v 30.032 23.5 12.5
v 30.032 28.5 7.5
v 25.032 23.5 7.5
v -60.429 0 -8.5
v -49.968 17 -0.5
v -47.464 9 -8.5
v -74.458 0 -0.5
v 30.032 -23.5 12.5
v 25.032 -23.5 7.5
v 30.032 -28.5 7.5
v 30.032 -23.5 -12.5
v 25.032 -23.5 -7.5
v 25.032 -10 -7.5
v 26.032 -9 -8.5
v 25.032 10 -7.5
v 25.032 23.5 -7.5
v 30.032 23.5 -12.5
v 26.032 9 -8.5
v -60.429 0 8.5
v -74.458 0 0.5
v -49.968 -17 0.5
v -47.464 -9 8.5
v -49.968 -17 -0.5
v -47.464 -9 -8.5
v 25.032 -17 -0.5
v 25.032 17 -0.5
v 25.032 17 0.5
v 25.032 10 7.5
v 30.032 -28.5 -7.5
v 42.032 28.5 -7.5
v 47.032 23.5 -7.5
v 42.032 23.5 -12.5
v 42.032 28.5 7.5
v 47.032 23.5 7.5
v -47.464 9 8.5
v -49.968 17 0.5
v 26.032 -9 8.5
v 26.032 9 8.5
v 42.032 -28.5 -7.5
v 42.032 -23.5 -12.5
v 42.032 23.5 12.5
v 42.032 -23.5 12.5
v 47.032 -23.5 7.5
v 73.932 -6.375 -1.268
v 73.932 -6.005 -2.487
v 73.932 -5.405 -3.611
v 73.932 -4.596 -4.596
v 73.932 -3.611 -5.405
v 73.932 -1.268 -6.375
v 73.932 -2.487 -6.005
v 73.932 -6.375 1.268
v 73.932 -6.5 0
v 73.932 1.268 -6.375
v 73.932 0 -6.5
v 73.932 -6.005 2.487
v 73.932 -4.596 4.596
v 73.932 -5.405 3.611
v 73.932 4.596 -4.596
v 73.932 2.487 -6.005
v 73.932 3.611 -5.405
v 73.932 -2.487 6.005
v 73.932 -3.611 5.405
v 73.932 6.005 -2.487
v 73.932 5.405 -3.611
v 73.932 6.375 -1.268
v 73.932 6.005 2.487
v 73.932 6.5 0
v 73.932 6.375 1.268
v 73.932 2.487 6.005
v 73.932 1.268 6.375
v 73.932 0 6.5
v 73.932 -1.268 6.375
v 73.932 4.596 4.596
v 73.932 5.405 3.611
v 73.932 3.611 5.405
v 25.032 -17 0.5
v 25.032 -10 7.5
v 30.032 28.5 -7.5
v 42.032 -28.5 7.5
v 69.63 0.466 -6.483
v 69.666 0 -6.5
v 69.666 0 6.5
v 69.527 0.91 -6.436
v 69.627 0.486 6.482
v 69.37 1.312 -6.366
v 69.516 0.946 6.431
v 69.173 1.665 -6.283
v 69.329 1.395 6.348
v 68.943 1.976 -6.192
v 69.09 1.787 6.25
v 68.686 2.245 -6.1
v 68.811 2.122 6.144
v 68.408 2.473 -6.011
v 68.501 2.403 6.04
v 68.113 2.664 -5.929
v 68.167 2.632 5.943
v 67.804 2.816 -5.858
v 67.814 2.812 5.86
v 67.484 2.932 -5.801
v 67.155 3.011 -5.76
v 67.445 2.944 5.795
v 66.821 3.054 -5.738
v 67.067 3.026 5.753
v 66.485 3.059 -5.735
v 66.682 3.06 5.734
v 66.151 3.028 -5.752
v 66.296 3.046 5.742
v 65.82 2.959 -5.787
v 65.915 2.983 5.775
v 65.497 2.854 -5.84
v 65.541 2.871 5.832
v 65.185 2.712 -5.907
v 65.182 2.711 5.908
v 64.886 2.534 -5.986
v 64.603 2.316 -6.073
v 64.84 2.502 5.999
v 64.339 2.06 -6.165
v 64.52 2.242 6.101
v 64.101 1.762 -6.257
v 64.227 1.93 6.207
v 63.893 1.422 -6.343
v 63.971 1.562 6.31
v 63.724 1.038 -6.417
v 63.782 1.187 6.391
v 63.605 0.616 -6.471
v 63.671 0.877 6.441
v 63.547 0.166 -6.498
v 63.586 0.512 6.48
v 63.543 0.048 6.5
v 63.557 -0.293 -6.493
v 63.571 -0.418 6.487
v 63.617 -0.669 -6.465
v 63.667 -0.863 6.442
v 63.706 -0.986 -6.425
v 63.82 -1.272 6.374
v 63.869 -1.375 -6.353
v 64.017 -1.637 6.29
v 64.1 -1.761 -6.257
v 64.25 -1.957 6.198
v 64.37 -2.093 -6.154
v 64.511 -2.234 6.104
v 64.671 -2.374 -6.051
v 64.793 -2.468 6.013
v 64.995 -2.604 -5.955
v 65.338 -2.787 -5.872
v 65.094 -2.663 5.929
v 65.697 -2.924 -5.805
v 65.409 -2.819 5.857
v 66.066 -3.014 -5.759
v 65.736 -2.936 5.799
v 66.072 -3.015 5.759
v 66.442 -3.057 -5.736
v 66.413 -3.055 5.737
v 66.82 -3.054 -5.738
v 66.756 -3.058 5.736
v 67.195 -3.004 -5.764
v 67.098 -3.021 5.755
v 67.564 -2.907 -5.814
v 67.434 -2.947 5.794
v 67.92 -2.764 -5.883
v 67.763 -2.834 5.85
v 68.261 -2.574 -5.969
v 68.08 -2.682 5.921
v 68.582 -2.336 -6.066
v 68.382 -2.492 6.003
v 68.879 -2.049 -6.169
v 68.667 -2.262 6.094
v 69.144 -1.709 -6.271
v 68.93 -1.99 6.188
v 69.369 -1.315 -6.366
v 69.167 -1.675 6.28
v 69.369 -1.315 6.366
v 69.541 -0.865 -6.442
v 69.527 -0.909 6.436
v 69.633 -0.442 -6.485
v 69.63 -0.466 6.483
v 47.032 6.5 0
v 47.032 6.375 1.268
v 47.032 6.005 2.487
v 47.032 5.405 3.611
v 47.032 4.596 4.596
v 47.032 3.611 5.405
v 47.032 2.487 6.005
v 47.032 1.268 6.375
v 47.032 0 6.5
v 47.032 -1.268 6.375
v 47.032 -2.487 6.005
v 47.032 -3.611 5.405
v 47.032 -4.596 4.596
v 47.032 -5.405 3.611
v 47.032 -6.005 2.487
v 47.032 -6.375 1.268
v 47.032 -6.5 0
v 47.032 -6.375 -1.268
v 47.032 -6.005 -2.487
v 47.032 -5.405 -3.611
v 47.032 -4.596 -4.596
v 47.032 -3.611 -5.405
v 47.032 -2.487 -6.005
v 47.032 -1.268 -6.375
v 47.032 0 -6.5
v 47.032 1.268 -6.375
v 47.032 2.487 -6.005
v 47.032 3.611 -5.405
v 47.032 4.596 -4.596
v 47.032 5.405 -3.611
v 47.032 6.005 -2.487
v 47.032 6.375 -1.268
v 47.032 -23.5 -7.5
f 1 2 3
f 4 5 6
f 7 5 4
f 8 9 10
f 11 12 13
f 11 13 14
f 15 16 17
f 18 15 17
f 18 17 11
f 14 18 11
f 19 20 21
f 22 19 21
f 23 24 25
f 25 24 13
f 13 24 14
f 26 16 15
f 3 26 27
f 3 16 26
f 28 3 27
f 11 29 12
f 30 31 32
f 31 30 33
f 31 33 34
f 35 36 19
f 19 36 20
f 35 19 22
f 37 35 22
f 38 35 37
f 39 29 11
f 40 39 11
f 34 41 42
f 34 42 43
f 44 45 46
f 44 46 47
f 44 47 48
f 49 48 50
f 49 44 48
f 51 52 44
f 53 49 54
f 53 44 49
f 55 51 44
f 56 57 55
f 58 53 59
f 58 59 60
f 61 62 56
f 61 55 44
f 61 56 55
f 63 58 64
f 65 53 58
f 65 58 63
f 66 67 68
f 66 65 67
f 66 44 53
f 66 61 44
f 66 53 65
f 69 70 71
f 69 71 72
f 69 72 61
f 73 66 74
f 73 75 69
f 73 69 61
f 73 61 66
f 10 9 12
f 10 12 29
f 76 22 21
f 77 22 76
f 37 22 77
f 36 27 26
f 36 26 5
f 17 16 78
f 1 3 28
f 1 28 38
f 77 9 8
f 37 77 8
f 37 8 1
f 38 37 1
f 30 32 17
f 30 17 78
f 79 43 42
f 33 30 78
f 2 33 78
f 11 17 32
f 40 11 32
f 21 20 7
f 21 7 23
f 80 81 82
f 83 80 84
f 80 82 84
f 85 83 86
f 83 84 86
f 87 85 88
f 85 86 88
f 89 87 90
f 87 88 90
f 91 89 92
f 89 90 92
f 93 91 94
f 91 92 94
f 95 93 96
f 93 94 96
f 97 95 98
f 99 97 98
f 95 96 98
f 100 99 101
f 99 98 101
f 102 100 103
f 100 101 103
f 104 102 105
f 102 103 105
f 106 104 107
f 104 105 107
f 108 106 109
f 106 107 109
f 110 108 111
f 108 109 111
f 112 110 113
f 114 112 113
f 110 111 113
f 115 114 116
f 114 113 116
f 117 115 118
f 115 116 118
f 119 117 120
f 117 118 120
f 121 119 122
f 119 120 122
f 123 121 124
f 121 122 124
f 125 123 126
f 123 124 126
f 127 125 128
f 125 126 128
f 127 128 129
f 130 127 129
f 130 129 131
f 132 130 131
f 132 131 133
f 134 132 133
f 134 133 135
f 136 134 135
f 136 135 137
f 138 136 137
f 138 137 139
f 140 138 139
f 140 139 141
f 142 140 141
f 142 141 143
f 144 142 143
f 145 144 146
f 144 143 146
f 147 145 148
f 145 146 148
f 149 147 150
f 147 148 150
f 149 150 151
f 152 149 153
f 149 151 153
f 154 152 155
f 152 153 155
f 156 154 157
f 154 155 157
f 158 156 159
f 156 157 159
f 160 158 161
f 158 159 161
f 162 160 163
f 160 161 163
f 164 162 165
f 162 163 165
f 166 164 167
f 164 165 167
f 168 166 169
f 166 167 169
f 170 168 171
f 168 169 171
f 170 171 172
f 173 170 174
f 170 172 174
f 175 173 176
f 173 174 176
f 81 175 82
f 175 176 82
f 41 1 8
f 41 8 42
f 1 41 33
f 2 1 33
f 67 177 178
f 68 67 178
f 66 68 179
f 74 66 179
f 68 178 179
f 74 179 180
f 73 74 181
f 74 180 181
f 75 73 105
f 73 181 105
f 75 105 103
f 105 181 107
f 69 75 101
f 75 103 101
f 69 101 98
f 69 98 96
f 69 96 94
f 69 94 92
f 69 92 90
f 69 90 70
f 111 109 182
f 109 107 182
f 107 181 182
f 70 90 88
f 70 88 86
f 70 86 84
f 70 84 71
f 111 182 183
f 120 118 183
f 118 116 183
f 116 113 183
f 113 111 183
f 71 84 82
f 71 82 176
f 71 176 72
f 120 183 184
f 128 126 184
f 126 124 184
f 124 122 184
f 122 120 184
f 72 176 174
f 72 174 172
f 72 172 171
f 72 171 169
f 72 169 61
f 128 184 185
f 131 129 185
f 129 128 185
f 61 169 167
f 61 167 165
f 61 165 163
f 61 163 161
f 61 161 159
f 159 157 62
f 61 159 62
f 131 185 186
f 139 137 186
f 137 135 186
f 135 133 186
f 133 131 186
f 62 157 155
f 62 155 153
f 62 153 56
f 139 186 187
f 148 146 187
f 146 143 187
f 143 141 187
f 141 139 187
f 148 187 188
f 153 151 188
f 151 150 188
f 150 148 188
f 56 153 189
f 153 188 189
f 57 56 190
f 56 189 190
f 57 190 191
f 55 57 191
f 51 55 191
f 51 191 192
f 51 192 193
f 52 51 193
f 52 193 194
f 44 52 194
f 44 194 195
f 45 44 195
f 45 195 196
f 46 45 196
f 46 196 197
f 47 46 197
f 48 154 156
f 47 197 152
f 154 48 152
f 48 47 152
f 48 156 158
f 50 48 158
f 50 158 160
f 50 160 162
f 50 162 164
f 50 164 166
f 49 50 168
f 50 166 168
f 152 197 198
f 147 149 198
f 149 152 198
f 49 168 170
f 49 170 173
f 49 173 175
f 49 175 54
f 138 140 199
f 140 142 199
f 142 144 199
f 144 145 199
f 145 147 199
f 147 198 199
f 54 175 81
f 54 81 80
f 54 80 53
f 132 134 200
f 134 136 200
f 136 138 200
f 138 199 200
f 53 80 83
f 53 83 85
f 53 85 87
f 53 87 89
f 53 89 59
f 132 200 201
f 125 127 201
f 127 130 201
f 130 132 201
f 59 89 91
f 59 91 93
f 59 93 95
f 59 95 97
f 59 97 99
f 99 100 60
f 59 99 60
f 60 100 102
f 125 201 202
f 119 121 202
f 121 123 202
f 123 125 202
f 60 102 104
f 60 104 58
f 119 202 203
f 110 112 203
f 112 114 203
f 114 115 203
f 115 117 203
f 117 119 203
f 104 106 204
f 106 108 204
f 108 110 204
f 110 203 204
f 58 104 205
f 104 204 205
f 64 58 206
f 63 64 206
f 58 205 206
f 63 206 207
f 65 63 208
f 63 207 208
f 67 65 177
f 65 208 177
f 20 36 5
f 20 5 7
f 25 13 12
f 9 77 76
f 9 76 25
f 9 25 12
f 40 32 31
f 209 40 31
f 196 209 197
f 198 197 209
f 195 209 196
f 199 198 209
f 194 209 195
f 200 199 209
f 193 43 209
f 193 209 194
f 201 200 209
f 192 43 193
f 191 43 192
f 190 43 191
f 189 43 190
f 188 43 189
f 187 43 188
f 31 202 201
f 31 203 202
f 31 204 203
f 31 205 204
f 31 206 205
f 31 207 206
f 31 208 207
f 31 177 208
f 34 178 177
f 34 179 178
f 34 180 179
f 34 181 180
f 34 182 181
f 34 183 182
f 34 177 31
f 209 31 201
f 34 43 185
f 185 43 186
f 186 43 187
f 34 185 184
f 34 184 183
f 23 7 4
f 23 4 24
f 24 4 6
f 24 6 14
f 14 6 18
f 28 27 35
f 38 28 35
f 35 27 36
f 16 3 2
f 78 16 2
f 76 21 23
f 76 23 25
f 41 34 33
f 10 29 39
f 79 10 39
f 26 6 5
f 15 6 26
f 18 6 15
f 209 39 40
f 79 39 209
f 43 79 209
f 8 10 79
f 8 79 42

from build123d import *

# Parameters (mm, degrees)
F1_DEPTH     = 12.5
F2_DEPTH     = 8.5
F3_SIZE      = 8
F4_T1_DEPTH  = 6.3508529611
F4_T3_DEPTH  = 6.3508529611
F4_T5_DEPTH  = 6.3508529611
F4_T7_DEPTH  = 6.3508529611
F4_T9_DEPTH  = 6.3508529611
F4_T11_DEPTH = 6.3508529611
F4_T13_DEPTH = 6.3508529611
F4_T15_DEPTH = 6.3508529611
F4_T17_DEPTH = 50.7168298797
F4_T19_DEPTH = 47.7168298797
F4_T21_DEPTH = 82.7168298797
F4_T26_DEPTH = 82.7168298797
F4_T31_DEPTH = 82.7168298797
F4_T36_DEPTH = 82.7168298797
F4_T41_DEPTH = 82.7168298797
F4_T46_DEPTH = 82.7168298797
F4_T51_DEPTH = 82.7168298797
F5_R         = 6.5
F6_DEPTH     = 26.9
F7_R         = 3.0614301368
F8_DEPTH     = 6.5


# Not quite as in the source:
# - a fillet or chamfer that OpenCascade refuses, or shapes differently, is made with other operations: its cross-section is extruded or revolved along the edge and cut away or added


with BuildPart() as f1:
    # F0 (on Top) → F1 (new body, symmetric)
    with BuildSketch(Plane.XY):
        Polygon((25.0318072736, -28.5), (47.0318072736, -28.5), (47.0318072736, 0), (47.0318072736, 28.5), (25.0318072736, 28.5), (25.0318072736, 17), (25.0318072736, -17), align=None)
    extrude(amount=F1_DEPTH, both=True)

    # F0 (on Top) → F2 (join, symmetric)
    with BuildSketch(Plane.XY):
        Polygon((-49.9681927264, -17), (25.0318072736, -17), (25.0318072736, 17), (-49.9681927264, 17), (-74.4579061866, 0), align=None)
    extrude(amount=F2_DEPTH, both=True)

    # F3
    f3_edges = [f1.edges().sort_by_distance(p)[0] for p in [
        (-12.468193, 17, -8.5),
        (-12.468193, -17, -8.5),
        (-62.213049, -8.5, -8.5),
        (-12.468193, -17, 8.5),
        (-12.468193, 17, 8.5),
        (-62.213049, -8.5, 8.5),
        (-62.213049, 8.5, 8.5),
        (-62.213049, 8.5, -8.5),
    ]]
    chamfer(f3_edges, length=F3_SIZE)

    # F4: chamfer of 5 on 12 edges, made by hand

    # F4_s2 → F4_t1 (cut)
    with BuildSketch(Plane(origin=(-1.9893975755, 1.9893975755, -1.9893975755), x_dir=(-0.7071067812, -0.7071067812, 0), z_dir=(-0.5773502692, 0.5773502692, -0.5773502692))):
        Polygon((-34.3171700264, -6.7490820577), (-37.8527039324, -12.8728064147), (-41.3882378383, -6.7490820577), align=None)
    extrude(amount=F4_T1_DEPTH, mode=Mode.SUBTRACT)

    # F4_s4 → F4_t3 (cut)
    with BuildSketch(Plane(origin=(-1.9893975755, -1.9893975755, -1.9893975755), x_dir=(0.7071067812, -0.7071067812, 0), z_dir=(-0.5773502692, -0.5773502692, -0.5773502692))):
        Polygon((34.3171700264, -6.7490820577), (41.3882378383, -6.7490820577), (37.8527039324, -12.8728064147), align=None)
    extrude(amount=F4_T3_DEPTH, mode=Mode.SUBTRACT)

    # F4_s6 → F4_t5 (cut)
    with BuildSketch(Plane(origin=(-1.9893975755, -1.9893975755, 1.9893975755), x_dir=(0.7071067812, -0.7071067812, 0), z_dir=(-0.5773502692, -0.5773502692, 0.5773502692))):
        Polygon((34.3171700264, 6.7490820577), (41.3882378383, 6.7490820577), (37.8527039324, 12.8728064147), align=None)
    extrude(amount=F4_T5_DEPTH, mode=Mode.SUBTRACT)

    # F4_s8 → F4_t7 (cut)
    with BuildSketch(Plane(origin=(-1.9893975755, 1.9893975755, 1.9893975755), x_dir=(-0.7071067812, -0.7071067812, 0), z_dir=(-0.5773502692, 0.5773502692, 0.5773502692))):
        Polygon((-34.3171700264, 6.7490820577), (-37.8527039324, 12.8728064147), (-41.3882378383, 6.7490820577), align=None)
    extrude(amount=F4_T7_DEPTH, mode=Mode.SUBTRACT)

    # F4_s10 → F4_t9 (cut)
    with BuildSketch(Plane(origin=(26.0106024245, 26.0106024245, -26.0106024245), x_dir=(-0.7071067812, 0.7071067812, 0), z_dir=(0.5773502692, 0.5773502692, -0.5773502692))):
        Polygon((-16.6395004968, 22.6707653858), (-13.1039665908, 16.5470410289), (-9.5684326849, 22.6707653858), align=None)
    extrude(amount=F4_T9_DEPTH, mode=Mode.SUBTRACT)

    # F4_s12 → F4_t11 (cut)
    with BuildSketch(Plane(origin=(26.0106024245, 26.0106024245, 26.0106024245), x_dir=(-0.7071067812, 0.7071067812, 0), z_dir=(0.5773502692, 0.5773502692, 0.5773502692))):
        Polygon((-13.1039665908, -16.5470410289), (-16.6395004968, -22.6707653858), (-9.5684326849, -22.6707653858), align=None)
    extrude(amount=F4_T11_DEPTH, mode=Mode.SUBTRACT)

    # F4_s14 → F4_t13 (cut)
    with BuildSketch(Plane(origin=(26.0106024245, -26.0106024245, -26.0106024245), x_dir=(0.7071067812, 0.7071067812, 0), z_dir=(0.5773502692, -0.5773502692, -0.5773502692))):
        Polygon((16.6395004968, 22.6707653858), (9.5684326849, 22.6707653858), (13.1039665908, 16.5470410289), align=None)
    extrude(amount=F4_T13_DEPTH, mode=Mode.SUBTRACT)

    # F4_s16 → F4_t15 (cut)
    with BuildSketch(Plane(origin=(26.0106024245, -26.0106024245, 26.0106024245), x_dir=(0.7071067812, 0.7071067812, 0), z_dir=(0.5773502692, -0.5773502692, 0.5773502692))):
        Polygon((9.5684326849, -22.6707653858), (13.1039665908, -16.5470410289), (16.6395004968, -22.6707653858), align=None)
    extrude(amount=F4_T15_DEPTH, mode=Mode.SUBTRACT)

    # F4_s18 → F4_t17 (cut)
    with BuildSketch(Plane.XY.offset(-25.3584149398)):
        Polygon((25.0318072736, -23.5), (30.0318072736, -28.5), (25.0318072736, -28.5), align=None)
        Polygon((25.0318072736, 23.5), (30.0318072736, 28.5), (25.0318072736, 28.5), align=None)
        Polygon((42.0318072736, 28.5), (47.0318072736, 23.5), (47.0318072736, 28.5), align=None)
        Polygon((42.0318072736, -28.5), (47.0318072736, -23.5), (47.0318072736, -28.5), align=None)
    extrude(amount=F4_T17_DEPTH, mode=Mode.SUBTRACT)

    # F4_s20 → F4_t19 (cut)
    with BuildSketch(Plane.YZ.offset(12.1733923338)):
        Polygon((23.5, -12.5), (28.5, -7.5), (28.5, -12.5), align=None)
        Polygon((23.5, 12.5), (28.5, 7.5), (28.5, 12.5), align=None)
        Polygon((-28.5, -7.5), (-23.5, -12.5), (-28.5, -12.5), align=None)
        Polygon((-28.5, 7.5), (-23.5, 12.5), (-28.5, 12.5), align=None)
    extrude(amount=F4_T19_DEPTH, mode=Mode.SUBTRACT)

    # F4_s22 → F4_t21 (cut)
    with BuildSketch(Plane.XZ.offset(-41.3584149398)):
        Polygon((42.0318072736, 12.5), (47.0318072736, 7.5), (47.0318072736, 12.5), align=None)
        Polygon((42.0318072736, -12.5), (47.0318072736, -7.5), (47.0318072736, -12.5), align=None)
    extrude(amount=F4_T21_DEPTH, mode=Mode.SUBTRACT)


with BuildPart() as f4_tool24:
    # F4_s25 → F4_t26 (new body)
    with BuildSketch(Plane.XZ.offset(-41.3584149398)):
        Polygon((25.0318072736, -7.5), (30.0318072736, -12.5), (25.0318072736, -12.5), align=None)
    extrude(amount=F4_T26_DEPTH)

    split(bisect_by=Plane(origin=(0, 8.75, -8.75), x_dir=(1, 0, 0), z_dir=(0, 0.7071067812, -0.7071067812)), keep=Keep.TOP)


with BuildPart() as f1_1:
    add(f1.part)

    # F4_t23: cut F4_tool24
    add(f4_tool24.part, mode=Mode.SUBTRACT)


with BuildPart() as f4_tool29:
    # F4_s30 → F4_t31 (new body)
    with BuildSketch(Plane.XZ.offset(-41.3584149398)):
        Polygon((25.0318072736, -7.5), (30.0318072736, -12.5), (25.0318072736, -12.5), align=None)
    extrude(amount=F4_T31_DEPTH)

    split(bisect_by=Plane.XY.offset(-8.5), keep=Keep.BOTTOM)


with BuildPart() as f1_2:
    add(f1_1.part)

    # F4_t28: cut F4_tool29
    add(f4_tool29.part, mode=Mode.SUBTRACT)


with BuildPart() as f4_tool34:
    # F4_s35 → F4_t36 (new body)
    with BuildSketch(Plane.XZ.offset(-41.3584149398)):
        Polygon((25.0318072736, -7.5), (30.0318072736, -12.5), (25.0318072736, -12.5), align=None)
    extrude(amount=F4_T36_DEPTH)

    split(bisect_by=Plane(origin=(0, -8.75, -8.75), x_dir=(1, 0, 0), z_dir=(0, -0.7071067812, -0.7071067812)), keep=Keep.TOP)


with BuildPart() as f1_3:
    add(f1_2.part)

    # F4_t33: cut F4_tool34
    add(f4_tool34.part, mode=Mode.SUBTRACT)


with BuildPart() as f4_tool39:
    # F4_s40 → F4_t41 (new body)
    with BuildSketch(Plane.XZ.offset(41.3584149398)):
        Polygon((25.0318072736, 7.5), (30.0318072736, 12.5), (25.0318072736, 12.5), align=None)
    extrude(amount=-F4_T41_DEPTH)

    split(bisect_by=Plane(origin=(0, -8.75, 8.75), x_dir=(1, 0, 0), z_dir=(0, -0.7071067812, 0.7071067812)), keep=Keep.TOP)


with BuildPart() as f1_4:
    add(f1_3.part)

    # F4_t38: cut F4_tool39
    add(f4_tool39.part, mode=Mode.SUBTRACT)


with BuildPart() as f4_tool44:
    # F4_s45 → F4_t46 (new body)
    with BuildSketch(Plane.XZ.offset(41.3584149398)):
        Polygon((25.0318072736, 7.5), (30.0318072736, 12.5), (25.0318072736, 12.5), align=None)
    extrude(amount=-F4_T46_DEPTH)

    split(bisect_by=Plane.XY.offset(8.5), keep=Keep.TOP)


with BuildPart() as f1_5:
    add(f1_4.part)

    # F4_t43: cut F4_tool44
    add(f4_tool44.part, mode=Mode.SUBTRACT)


with BuildPart() as f4_tool49:
    # F4_s50 → F4_t51 (new body)
    with BuildSketch(Plane.XZ.offset(41.3584149398)):
        Polygon((25.0318072736, 7.5), (30.0318072736, 12.5), (25.0318072736, 12.5), align=None)
    extrude(amount=-F4_T51_DEPTH)

    split(bisect_by=Plane(origin=(0, 8.75, 8.75), x_dir=(1, 0, 0), z_dir=(0, 0.7071067812, 0.7071067812)), keep=Keep.TOP)


with BuildPart() as f1_6:
    add(f1_5.part)

    # F4_t48: cut F4_tool49
    add(f4_tool49.part, mode=Mode.SUBTRACT)

    # F5 (on face) → F6 (join)
    with BuildSketch(Plane.YZ.offset(47.0318072736)):
        Circle(F5_R)
    extrude(amount=F6_DEPTH)

    # F7 (on Top) → F8 (cut, symmetric)
    with BuildSketch(Plane.XY):
        with Locations((66.6042044759, 0)):
            Circle(F7_R)
    extrude(amount=F8_DEPTH, both=True, mode=Mode.SUBTRACT)


solid = f1_6.part
